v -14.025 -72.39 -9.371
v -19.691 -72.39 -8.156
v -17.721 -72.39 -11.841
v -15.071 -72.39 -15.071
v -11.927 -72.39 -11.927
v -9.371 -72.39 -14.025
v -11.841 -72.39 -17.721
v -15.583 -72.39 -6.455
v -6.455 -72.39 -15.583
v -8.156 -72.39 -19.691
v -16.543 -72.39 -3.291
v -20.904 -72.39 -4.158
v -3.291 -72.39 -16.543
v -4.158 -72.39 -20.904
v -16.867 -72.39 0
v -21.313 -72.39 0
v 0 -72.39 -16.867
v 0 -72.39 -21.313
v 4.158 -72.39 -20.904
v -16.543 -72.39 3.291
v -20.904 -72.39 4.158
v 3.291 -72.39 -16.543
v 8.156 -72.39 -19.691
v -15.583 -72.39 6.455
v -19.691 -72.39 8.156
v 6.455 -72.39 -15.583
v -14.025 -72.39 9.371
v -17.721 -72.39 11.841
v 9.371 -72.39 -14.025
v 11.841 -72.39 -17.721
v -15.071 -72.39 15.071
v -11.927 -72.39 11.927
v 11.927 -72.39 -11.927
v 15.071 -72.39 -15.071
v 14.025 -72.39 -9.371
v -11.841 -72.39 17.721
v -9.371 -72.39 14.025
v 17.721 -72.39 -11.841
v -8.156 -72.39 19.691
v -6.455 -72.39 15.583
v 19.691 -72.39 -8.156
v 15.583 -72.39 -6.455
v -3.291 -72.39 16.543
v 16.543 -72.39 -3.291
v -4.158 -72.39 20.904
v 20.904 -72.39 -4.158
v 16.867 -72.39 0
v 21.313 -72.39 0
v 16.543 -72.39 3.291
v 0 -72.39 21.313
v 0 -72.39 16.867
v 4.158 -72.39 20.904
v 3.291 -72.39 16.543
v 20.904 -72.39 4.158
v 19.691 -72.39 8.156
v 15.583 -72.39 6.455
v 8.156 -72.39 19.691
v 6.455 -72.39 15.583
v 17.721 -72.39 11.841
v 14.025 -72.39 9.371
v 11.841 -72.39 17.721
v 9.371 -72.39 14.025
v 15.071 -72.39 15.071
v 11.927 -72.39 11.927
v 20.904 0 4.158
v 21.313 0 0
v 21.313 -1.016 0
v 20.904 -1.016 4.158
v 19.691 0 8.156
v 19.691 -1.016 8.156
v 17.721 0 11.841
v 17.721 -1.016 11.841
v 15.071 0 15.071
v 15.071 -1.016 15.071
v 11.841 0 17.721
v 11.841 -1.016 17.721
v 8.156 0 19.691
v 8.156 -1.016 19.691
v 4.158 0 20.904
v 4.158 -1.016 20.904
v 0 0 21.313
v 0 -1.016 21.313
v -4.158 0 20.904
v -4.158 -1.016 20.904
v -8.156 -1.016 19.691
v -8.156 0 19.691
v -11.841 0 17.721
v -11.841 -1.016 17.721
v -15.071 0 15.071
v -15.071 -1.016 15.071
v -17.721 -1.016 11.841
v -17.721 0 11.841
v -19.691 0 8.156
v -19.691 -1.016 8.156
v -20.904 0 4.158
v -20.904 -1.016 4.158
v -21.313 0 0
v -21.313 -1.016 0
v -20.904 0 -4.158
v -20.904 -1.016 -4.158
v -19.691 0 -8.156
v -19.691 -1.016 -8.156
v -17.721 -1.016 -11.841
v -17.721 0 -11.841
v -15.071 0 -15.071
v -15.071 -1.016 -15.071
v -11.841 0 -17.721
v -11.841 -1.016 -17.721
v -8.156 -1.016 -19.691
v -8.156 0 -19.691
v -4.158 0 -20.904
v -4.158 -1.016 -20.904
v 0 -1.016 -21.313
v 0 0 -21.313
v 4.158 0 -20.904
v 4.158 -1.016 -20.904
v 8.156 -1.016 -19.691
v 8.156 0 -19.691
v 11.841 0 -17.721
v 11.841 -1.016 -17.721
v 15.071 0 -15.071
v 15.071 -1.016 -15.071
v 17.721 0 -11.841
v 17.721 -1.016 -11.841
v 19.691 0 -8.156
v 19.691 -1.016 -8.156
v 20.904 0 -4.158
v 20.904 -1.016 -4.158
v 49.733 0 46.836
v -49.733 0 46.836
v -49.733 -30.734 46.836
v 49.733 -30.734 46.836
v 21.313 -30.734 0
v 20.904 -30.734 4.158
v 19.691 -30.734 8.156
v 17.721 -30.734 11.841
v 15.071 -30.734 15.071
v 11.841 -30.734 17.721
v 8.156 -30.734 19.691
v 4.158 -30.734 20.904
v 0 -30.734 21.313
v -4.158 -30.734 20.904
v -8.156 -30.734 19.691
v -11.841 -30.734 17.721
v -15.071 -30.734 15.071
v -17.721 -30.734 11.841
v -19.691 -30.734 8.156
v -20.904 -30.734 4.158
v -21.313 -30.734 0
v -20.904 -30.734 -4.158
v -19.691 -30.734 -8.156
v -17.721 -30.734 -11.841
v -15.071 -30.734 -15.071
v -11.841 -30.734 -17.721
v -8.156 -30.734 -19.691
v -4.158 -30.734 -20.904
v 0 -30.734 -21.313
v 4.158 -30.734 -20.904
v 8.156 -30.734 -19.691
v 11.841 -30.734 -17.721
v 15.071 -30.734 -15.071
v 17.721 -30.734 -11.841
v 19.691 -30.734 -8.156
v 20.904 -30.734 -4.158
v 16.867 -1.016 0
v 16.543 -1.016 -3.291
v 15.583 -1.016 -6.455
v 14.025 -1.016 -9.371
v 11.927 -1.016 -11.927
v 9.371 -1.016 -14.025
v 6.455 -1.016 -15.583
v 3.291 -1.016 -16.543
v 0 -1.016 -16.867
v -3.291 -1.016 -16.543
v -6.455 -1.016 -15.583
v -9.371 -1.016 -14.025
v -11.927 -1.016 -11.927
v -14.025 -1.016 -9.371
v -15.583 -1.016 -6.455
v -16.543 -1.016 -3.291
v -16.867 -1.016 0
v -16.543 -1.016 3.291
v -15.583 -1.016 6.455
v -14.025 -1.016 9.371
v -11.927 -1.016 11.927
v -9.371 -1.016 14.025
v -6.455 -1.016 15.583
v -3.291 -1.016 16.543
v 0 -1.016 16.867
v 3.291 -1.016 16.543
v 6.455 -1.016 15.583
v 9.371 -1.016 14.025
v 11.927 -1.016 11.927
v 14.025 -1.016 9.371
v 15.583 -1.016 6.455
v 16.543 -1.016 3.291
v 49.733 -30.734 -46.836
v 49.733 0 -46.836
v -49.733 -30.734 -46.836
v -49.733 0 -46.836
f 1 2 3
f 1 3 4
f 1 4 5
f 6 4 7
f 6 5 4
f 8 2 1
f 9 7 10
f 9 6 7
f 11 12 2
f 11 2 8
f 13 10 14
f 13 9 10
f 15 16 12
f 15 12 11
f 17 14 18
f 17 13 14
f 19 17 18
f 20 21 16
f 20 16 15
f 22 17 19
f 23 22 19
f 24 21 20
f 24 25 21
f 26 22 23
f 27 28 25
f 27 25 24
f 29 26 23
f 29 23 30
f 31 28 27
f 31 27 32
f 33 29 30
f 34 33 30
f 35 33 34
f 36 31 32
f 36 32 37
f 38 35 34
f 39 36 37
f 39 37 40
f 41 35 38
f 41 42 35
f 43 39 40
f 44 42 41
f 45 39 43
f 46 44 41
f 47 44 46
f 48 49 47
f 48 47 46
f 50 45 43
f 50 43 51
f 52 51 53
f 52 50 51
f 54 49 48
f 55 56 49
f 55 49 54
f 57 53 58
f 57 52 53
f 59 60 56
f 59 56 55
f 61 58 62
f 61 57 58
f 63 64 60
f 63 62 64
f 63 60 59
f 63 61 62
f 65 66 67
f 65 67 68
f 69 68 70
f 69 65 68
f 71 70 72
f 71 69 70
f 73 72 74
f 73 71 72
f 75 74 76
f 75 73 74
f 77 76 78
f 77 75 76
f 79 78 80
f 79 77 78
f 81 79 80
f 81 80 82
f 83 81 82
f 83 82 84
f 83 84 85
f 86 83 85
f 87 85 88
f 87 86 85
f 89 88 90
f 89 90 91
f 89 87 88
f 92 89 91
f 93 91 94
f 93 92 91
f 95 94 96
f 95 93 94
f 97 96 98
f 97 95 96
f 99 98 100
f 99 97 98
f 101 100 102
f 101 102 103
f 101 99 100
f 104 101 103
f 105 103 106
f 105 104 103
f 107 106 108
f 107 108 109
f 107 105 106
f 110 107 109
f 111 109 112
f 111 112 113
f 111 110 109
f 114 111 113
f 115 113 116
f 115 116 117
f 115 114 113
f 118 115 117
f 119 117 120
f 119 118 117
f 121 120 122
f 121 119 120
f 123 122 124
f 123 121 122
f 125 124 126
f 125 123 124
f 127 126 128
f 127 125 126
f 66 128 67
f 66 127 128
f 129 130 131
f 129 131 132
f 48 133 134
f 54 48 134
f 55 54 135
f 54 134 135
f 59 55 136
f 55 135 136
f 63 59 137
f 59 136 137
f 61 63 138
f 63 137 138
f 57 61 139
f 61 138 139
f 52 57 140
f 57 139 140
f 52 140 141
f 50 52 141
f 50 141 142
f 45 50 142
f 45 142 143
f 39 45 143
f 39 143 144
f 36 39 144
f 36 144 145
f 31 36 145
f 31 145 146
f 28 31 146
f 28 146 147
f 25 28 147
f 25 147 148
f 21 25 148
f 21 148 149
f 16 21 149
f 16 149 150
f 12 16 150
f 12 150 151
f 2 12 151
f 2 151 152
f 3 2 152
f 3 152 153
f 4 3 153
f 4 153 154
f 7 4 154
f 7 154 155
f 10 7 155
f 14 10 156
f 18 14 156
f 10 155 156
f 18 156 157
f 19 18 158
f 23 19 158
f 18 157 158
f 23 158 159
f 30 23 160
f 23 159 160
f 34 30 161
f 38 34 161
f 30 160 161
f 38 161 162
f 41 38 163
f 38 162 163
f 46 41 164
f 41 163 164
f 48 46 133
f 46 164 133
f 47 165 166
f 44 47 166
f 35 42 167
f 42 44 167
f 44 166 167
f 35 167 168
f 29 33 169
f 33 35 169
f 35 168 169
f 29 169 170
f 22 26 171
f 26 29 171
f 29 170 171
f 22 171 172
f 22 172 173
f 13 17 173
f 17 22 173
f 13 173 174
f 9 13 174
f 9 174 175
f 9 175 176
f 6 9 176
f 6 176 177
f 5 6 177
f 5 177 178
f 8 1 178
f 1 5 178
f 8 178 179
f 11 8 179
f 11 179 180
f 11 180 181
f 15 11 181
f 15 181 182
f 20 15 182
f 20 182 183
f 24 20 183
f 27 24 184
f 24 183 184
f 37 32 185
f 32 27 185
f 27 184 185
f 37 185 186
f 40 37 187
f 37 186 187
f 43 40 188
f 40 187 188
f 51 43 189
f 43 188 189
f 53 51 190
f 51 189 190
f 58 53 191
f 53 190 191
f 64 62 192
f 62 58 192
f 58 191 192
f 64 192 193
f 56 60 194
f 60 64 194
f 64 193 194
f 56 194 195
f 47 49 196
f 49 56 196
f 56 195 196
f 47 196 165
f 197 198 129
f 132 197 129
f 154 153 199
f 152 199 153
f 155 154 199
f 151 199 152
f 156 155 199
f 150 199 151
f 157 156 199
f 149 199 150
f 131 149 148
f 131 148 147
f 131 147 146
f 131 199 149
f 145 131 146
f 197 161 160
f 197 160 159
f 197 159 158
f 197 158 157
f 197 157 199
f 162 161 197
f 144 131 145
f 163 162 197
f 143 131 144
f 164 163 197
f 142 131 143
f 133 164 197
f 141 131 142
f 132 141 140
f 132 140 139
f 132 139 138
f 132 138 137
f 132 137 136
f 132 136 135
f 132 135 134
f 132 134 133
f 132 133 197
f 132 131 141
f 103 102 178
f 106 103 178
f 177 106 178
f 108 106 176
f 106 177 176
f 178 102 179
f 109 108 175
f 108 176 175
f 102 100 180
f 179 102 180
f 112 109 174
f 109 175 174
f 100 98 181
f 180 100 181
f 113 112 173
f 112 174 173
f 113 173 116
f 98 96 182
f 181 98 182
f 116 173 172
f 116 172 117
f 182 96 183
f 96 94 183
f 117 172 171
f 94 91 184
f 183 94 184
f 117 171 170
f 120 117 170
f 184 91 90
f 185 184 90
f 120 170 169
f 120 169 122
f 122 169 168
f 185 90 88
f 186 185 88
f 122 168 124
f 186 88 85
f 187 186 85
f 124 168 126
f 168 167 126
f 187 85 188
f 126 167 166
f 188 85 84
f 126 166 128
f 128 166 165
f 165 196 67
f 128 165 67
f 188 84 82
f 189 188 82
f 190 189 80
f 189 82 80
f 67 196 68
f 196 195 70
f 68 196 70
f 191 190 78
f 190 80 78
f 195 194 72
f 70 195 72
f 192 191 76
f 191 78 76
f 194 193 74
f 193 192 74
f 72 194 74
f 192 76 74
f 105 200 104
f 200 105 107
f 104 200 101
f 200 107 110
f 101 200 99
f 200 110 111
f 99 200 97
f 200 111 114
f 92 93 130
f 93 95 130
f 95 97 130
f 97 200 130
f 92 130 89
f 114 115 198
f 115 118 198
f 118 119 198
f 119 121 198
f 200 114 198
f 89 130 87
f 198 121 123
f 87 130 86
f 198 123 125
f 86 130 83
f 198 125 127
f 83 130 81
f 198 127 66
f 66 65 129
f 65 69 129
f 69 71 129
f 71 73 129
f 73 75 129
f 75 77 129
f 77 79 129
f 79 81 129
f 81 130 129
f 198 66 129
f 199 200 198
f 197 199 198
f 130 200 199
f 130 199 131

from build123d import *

# Parameters (mm, degrees)
F0_W      = 99.465304
F0_H      = 93.672826
F1_DEPTH  = 30.734
F2_R      = 21.313315
F2_R_2    = 16.867253
F3_DEPTH  = 72.39
F4_DEPTH  = 1.016
F4_FACE_R = 16.867253
F6_DEPTH  = 76.708


with BuildPart() as f1:
    # F0 (on Front) → F1 (new body)
    with BuildSketch(Plane.XZ):
        Rectangle(F0_W, F0_H)
    extrude(amount=F1_DEPTH)

    # F2 (on Front) → F3 (join)
    with BuildSketch(Plane.XZ):
        Circle(F2_R)
        Circle(F2_R_2, mode=Mode.SUBTRACT)
    extrude(amount=F3_DEPTH)

    # F2 (on Front) → F4 (cut)
    with BuildSketch(Plane.XZ):
        Circle(F2_R)
        Circle(F2_R_2, mode=Mode.SUBTRACT)
    extrude(amount=F4_DEPTH, mode=Mode.SUBTRACT)

    # F4_face (on face) → F6 (cut)
    with BuildSketch(Plane(origin=(0, 0, 0), x_dir=(1, 0, 0), z_dir=(0, 1, 0))):
        Circle(F4_FACE_R)
    extrude(amount=-F6_DEPTH, mode=Mode.SUBTRACT)


solid = f1.part
